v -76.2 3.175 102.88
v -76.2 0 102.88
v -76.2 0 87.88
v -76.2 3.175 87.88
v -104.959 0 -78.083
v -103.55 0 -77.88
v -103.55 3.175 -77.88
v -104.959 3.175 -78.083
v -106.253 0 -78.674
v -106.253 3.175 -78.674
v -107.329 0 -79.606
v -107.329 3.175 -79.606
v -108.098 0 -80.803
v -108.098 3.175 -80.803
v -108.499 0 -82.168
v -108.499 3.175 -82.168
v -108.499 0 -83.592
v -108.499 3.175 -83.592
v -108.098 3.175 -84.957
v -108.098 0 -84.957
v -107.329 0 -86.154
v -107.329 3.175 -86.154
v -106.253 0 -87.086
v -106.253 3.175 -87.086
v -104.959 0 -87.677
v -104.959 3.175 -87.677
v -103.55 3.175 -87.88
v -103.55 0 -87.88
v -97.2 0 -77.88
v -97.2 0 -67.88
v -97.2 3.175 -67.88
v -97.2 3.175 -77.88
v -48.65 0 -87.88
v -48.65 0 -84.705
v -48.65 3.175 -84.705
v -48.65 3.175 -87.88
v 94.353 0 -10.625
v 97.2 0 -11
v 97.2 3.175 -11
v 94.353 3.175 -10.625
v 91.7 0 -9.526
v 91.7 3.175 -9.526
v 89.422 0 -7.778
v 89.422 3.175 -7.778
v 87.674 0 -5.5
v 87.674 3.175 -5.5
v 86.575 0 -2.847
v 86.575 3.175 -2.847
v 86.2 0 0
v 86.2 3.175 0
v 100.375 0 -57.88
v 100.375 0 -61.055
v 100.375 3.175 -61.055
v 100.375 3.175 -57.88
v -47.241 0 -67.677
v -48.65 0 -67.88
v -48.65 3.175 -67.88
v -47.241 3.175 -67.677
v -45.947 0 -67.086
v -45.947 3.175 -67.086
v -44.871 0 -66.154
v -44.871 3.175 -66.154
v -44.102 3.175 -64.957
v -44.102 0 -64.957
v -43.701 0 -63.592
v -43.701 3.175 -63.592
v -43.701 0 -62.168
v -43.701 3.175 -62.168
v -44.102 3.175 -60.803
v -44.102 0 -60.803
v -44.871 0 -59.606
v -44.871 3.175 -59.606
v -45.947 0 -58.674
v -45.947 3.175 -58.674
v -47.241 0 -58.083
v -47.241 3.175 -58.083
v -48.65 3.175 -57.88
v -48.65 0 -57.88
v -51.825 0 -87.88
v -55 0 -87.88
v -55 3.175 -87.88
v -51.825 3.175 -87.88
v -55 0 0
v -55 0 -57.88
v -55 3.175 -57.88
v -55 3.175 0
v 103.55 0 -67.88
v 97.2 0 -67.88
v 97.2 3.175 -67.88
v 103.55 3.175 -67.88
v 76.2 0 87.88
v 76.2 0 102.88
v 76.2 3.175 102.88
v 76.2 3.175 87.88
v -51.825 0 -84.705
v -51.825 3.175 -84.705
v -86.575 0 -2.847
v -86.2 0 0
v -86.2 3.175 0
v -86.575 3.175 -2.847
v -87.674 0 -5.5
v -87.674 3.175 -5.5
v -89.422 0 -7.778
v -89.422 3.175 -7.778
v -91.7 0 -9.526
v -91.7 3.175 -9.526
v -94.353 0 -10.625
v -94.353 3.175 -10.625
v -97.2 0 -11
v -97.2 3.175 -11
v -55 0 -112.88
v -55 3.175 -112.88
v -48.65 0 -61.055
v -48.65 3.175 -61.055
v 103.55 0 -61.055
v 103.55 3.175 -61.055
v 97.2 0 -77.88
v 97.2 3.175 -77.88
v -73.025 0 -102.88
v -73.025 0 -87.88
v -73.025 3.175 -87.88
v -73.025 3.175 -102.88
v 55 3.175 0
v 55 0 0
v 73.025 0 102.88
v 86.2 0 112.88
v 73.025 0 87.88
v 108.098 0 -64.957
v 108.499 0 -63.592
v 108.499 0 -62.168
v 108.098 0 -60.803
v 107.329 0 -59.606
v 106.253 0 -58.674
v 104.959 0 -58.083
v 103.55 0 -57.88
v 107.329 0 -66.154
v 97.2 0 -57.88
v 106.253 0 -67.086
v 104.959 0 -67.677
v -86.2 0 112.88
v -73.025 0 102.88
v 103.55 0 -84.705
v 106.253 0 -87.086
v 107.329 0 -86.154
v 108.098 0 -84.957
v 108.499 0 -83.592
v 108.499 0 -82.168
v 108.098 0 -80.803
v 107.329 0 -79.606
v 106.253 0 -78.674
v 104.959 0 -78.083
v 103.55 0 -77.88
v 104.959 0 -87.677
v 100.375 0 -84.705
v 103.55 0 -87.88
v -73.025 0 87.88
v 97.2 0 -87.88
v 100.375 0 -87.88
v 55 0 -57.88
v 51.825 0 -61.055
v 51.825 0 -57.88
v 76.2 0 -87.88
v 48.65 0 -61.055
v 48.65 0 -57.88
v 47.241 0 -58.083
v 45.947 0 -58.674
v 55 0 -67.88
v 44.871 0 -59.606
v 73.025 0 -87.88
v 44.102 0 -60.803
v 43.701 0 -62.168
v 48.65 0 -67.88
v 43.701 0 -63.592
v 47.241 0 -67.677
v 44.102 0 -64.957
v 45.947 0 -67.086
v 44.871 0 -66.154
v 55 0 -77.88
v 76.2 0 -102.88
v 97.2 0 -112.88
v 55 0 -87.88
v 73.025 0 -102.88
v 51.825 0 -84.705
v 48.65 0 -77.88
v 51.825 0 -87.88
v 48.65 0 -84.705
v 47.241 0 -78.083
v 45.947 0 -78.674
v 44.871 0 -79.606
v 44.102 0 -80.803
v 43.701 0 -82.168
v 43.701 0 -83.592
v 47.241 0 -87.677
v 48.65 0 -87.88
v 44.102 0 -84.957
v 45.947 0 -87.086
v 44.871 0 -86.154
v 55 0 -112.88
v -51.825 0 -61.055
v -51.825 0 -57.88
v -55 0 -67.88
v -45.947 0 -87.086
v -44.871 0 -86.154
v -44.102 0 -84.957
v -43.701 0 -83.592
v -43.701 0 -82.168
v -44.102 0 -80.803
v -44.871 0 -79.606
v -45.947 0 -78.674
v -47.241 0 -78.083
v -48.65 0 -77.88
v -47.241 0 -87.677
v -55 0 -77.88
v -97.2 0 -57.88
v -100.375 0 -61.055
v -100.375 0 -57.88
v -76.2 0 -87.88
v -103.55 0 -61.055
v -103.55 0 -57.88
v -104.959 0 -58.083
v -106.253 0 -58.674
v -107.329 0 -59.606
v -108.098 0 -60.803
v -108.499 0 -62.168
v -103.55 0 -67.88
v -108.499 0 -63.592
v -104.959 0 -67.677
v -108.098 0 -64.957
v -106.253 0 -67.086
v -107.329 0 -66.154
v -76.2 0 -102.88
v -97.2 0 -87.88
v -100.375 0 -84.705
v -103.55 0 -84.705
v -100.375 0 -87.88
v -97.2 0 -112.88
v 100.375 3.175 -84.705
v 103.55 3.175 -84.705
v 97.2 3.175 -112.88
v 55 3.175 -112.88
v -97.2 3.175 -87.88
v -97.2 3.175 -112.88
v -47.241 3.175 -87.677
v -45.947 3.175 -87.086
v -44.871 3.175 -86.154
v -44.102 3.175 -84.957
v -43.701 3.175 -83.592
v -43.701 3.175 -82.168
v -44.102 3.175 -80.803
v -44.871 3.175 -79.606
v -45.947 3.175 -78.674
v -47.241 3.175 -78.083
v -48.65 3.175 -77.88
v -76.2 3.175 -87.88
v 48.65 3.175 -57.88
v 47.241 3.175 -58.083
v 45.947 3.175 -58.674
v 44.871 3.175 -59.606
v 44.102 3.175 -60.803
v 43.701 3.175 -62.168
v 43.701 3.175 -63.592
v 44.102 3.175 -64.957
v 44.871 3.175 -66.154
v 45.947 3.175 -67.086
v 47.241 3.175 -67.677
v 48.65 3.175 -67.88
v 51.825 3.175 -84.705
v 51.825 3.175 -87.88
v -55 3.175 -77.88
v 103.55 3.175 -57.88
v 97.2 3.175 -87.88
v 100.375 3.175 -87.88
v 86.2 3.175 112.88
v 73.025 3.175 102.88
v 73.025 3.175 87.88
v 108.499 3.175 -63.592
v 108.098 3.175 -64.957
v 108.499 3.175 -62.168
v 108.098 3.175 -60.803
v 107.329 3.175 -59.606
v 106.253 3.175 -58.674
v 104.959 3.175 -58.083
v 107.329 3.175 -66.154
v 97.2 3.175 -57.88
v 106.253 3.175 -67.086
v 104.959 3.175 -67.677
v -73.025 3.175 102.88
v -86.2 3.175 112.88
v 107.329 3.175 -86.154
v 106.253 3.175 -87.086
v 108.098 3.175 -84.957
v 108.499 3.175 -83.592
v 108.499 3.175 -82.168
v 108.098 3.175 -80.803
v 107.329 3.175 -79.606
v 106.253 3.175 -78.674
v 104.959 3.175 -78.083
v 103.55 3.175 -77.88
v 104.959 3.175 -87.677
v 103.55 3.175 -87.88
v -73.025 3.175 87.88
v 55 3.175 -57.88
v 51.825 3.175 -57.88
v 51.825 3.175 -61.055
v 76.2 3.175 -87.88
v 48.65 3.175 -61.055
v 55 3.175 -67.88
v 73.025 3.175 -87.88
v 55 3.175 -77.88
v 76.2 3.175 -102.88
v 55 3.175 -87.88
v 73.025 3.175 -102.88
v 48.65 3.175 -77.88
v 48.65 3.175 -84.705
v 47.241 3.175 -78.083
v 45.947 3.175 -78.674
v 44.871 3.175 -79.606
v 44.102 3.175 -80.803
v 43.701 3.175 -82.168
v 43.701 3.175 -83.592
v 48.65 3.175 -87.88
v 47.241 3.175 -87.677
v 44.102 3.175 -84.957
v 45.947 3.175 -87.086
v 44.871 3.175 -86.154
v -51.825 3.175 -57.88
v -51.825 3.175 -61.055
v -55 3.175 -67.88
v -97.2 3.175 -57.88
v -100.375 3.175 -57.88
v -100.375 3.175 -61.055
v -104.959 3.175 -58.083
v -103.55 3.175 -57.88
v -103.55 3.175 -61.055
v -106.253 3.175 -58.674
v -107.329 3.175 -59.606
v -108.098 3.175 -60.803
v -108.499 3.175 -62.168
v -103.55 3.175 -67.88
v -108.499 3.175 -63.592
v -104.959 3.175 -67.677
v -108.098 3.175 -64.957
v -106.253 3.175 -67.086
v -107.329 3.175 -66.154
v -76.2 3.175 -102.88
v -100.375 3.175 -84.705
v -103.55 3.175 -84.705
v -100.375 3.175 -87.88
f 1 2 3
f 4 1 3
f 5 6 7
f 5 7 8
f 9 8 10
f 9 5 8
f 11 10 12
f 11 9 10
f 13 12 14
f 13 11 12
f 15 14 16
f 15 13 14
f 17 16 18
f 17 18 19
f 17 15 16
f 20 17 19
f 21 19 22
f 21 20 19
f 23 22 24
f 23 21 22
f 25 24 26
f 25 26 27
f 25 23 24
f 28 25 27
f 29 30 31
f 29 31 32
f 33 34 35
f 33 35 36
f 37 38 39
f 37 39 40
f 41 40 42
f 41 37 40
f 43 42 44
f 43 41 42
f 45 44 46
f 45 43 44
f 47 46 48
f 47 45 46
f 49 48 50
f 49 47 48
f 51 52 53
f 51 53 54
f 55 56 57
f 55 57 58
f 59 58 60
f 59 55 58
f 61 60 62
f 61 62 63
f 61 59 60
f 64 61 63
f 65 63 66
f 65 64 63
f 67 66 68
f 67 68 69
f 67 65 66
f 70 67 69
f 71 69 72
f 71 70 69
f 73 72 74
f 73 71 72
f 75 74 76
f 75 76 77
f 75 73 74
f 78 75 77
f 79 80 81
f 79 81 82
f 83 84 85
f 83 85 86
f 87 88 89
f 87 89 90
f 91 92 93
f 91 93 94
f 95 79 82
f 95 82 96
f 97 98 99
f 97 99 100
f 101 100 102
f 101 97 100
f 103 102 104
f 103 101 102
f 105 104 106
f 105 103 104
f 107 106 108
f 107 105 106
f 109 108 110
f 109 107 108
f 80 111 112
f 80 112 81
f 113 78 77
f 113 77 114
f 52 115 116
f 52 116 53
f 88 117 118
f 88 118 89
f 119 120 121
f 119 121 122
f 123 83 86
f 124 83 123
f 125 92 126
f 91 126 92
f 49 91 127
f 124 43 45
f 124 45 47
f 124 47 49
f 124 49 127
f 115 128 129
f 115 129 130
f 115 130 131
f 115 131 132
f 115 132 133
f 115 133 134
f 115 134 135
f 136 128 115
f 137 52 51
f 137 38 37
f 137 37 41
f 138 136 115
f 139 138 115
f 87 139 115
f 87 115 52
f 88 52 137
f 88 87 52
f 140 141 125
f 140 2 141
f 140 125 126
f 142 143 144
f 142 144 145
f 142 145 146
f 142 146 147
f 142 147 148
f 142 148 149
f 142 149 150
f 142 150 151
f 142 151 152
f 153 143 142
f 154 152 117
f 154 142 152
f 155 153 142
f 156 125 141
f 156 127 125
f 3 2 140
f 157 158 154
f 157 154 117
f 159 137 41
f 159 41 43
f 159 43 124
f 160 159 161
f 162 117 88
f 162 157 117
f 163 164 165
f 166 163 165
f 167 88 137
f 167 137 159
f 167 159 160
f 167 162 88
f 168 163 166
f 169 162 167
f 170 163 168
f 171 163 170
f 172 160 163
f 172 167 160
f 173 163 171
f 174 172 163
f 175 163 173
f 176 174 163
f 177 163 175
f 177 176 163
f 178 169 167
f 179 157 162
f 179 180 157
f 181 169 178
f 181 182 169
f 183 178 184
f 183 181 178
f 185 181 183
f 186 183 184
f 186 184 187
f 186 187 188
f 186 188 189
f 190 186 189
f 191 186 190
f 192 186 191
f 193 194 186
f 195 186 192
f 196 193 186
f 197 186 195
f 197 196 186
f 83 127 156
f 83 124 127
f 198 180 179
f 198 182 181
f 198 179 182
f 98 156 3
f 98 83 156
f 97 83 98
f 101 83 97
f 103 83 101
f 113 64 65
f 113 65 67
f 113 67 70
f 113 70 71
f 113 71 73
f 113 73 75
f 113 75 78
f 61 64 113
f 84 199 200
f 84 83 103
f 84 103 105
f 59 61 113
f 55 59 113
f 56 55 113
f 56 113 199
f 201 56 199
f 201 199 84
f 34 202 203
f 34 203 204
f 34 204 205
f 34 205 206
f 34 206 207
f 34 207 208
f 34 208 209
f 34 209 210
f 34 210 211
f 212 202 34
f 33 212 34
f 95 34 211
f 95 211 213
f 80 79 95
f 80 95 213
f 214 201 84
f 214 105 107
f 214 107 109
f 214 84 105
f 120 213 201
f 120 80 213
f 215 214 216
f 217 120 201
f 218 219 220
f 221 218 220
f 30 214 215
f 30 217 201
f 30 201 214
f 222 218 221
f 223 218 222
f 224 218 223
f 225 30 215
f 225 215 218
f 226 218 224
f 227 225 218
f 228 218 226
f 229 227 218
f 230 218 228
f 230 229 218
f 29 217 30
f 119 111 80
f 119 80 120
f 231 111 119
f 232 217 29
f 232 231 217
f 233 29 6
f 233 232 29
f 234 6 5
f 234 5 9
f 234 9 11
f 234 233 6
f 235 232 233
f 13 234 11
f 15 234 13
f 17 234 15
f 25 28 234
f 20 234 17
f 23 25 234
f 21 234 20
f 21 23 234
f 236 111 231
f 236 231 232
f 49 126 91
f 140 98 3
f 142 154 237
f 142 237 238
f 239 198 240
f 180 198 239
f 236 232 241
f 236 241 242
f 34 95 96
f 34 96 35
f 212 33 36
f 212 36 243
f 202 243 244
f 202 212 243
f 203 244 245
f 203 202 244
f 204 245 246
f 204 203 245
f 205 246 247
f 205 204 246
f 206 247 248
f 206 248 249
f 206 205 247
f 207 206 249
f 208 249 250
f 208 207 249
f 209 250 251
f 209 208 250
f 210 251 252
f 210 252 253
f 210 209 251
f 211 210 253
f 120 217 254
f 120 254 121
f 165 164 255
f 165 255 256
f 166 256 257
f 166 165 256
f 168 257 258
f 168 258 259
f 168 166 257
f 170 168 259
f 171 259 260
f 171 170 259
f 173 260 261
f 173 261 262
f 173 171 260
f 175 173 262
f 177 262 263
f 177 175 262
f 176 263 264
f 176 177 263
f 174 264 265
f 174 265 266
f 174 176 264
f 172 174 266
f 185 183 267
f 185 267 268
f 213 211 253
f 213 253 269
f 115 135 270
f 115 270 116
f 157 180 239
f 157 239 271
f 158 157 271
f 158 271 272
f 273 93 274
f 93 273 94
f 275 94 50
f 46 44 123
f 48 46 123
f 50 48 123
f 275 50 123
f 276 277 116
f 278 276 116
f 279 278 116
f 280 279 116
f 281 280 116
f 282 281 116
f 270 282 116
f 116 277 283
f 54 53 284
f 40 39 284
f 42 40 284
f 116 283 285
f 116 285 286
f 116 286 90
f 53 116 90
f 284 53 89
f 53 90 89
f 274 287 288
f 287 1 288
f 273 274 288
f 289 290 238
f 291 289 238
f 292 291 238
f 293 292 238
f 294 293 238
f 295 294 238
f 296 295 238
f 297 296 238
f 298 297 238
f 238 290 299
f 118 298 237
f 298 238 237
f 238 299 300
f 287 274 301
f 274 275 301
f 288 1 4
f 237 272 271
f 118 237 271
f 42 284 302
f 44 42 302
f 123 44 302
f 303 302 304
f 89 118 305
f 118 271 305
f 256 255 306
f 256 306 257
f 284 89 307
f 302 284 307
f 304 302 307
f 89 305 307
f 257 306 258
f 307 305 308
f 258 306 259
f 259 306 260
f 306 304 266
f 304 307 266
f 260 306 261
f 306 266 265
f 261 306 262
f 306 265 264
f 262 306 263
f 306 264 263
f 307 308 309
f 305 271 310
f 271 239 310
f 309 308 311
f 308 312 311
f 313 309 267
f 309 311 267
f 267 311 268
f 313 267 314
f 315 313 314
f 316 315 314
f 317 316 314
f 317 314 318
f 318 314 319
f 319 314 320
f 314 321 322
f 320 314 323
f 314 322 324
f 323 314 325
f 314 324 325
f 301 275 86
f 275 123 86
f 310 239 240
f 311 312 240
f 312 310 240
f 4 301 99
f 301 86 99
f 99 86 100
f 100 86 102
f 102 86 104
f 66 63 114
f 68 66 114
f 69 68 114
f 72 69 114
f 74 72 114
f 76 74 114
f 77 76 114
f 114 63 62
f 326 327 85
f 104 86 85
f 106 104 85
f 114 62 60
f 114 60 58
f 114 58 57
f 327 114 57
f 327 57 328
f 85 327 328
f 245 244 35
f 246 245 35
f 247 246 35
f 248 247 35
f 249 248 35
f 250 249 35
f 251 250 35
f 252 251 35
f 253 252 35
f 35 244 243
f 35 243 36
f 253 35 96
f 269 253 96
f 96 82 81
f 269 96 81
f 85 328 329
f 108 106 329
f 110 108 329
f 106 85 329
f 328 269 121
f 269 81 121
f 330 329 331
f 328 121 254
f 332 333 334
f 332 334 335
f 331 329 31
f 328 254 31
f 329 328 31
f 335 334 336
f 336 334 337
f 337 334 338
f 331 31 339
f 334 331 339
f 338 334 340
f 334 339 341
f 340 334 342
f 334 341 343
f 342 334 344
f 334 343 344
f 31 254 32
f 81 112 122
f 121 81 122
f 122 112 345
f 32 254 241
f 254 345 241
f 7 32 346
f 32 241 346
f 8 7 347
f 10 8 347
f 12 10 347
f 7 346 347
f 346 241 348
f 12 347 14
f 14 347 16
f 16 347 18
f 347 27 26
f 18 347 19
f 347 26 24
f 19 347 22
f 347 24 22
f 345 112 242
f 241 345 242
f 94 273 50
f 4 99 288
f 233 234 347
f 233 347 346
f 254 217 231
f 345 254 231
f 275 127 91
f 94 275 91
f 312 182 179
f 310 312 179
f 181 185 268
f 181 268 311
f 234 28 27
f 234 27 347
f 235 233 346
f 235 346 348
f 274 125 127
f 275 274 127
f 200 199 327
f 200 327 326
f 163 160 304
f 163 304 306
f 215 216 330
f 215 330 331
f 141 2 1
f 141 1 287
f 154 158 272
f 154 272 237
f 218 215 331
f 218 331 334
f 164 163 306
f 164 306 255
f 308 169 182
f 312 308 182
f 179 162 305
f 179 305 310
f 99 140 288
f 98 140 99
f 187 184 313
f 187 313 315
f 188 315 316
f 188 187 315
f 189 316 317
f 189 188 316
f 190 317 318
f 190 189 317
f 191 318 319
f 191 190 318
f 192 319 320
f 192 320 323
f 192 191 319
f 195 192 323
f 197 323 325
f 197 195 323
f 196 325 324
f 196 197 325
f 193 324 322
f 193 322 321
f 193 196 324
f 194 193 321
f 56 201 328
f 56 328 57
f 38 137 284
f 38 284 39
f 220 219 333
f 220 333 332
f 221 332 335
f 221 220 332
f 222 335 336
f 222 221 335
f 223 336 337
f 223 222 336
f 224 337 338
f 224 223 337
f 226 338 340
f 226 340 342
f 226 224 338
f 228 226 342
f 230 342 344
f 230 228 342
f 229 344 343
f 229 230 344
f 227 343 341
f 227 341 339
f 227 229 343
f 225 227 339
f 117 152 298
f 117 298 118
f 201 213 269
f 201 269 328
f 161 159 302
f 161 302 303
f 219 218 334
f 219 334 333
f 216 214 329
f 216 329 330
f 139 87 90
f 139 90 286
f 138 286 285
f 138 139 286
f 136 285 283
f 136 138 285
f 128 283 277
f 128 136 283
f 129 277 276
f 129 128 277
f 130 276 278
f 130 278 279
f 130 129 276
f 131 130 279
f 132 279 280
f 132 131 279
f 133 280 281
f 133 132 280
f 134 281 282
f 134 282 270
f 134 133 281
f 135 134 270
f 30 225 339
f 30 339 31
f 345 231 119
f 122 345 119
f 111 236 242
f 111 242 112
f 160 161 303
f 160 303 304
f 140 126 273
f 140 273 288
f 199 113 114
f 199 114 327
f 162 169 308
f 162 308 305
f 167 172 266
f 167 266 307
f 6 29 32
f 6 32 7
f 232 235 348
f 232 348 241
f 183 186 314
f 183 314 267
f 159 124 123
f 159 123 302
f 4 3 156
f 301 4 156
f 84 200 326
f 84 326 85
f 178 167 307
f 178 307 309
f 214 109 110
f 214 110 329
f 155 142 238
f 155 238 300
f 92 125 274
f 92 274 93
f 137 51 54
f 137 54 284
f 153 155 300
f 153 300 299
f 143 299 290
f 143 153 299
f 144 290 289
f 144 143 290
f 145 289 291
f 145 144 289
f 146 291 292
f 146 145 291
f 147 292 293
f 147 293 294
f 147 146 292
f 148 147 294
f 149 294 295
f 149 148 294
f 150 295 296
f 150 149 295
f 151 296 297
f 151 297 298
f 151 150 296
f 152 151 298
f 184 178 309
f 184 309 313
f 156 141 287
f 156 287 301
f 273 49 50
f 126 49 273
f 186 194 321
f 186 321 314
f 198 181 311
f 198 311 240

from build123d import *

# Parameters (mm, degrees)
SKETCH1_W           = 3.175
SKETCH1_H           = 15
BOSS_EXTRUDE1_DEPTH = 3.175


with BuildPart() as part:
    # Sketch1 → Boss-Extrude1 (new body)
    with BuildSketch(Plane(origin=(0, 0, 0), x_dir=(1, 0, 0), z_dir=(0, 1, 0))):
        with BuildLine():
            Line((-55, 0), (55, 0))
            Line((55, 0), (55, 57.88))
            Line((55, 57.88), (51.825, 57.88))
            Line((51.825, 57.88), (51.825, 61.055))
            Line((51.825, 61.055), (48.65, 61.055))
            Line((48.65, 61.055), (48.65, 57.88))
            ThreePointArc((48.65, 57.88), (43.65, 62.88), (48.65, 67.88))
            Line((48.65, 67.88), (55, 67.88))
            Line((55, 67.88), (55, 77.88))
            Line((55, 77.88), (48.65, 77.88))
            ThreePointArc((48.65, 77.88), (43.65, 82.88), (48.65, 87.88))
            Line((48.65, 87.88), (48.65, 84.705))
            Line((48.65, 84.705), (51.825, 84.705))
            Line((51.825, 84.705), (51.825, 87.88))
            Line((51.825, 87.88), (55, 87.88))
            Line((55, 87.88), (55, 112.88))
            Line((55, 112.88), (76.2, 112.88))
            Line((76.2, 112.88), (86.2, 112.88))
            Line((86.2, 112.88), (97.2, 112.88))
            Line((97.2, 112.88), (97.2, 87.88))
            Line((97.2, 87.88), (100.375, 87.88))
            Line((100.375, 87.88), (100.375, 84.705))
            Line((100.375, 84.705), (103.55, 84.705))
            Line((103.55, 84.705), (103.55, 87.88))
            ThreePointArc((103.55, 87.88), (108.55, 82.88), (103.55, 77.88))
            Line((103.55, 77.88), (97.2, 77.88))
            Line((97.2, 77.88), (97.2, 67.88))
            Line((97.2, 67.88), (103.55, 67.88))
            ThreePointArc((103.55, 67.88), (108.55, 62.88), (103.55, 57.88))
            Line((103.55, 57.88), (103.55, 61.055))
            Line((103.55, 61.055), (100.375, 61.055))
            Line((100.375, 61.055), (100.375, 57.88))
            Line((100.375, 57.88), (97.2, 57.88))
            Line((97.2, 57.88), (97.2, 11))
            ThreePointArc((97.2, 11), (89.421825407, 7.778174593), (86.2, 0))
            Line((86.2, 0), (86.2, -102.88))
            Line((86.2, -102.88), (86.2, -112.88))
            Line((86.2, -112.88), (76.2, -112.88))
            Line((76.2, -112.88), (-76.2, -112.88))
            Line((-76.2, -112.88), (-86.2, -112.88))
            Line((-86.2, -112.88), (-86.2, -102.88))
            Line((-86.2, -102.88), (-86.2, 0))
            ThreePointArc((-86.2, 0), (-89.421825407, 7.778174593), (-97.2, 11))
            Line((-97.2, 11), (-97.2, 57.88))
            Line((-97.2, 57.88), (-100.375, 57.88))
            Line((-100.375, 57.88), (-100.375, 61.055))
            Line((-100.375, 61.055), (-103.55, 61.055))
            Line((-103.55, 61.055), (-103.55, 57.88))
            ThreePointArc((-103.55, 57.88), (-108.55, 62.88), (-103.55, 67.88))
            Line((-103.55, 67.88), (-97.2, 67.88))
            Line((-97.2, 67.88), (-97.2, 77.88))
            Line((-97.2, 77.88), (-103.55, 77.88))
            ThreePointArc((-103.55, 77.88), (-108.55, 82.88), (-103.55, 87.88))
            Line((-103.55, 87.88), (-103.55, 84.705))
            Line((-103.55, 84.705), (-100.375, 84.705))
            Line((-100.375, 84.705), (-100.375, 87.88))
            Line((-100.375, 87.88), (-97.2, 87.88))
            Line((-97.2, 87.88), (-97.2, 112.88))
            Line((-97.2, 112.88), (-86.2, 112.88))
            Line((-86.2, 112.88), (-76.2, 112.88))
            Line((-76.2, 112.88), (-55, 112.88))
            Line((-55, 112.88), (-55, 87.88))
            Line((-55, 87.88), (-51.825, 87.88))
            Line((-51.825, 87.88), (-51.825, 84.705))
            Line((-51.825, 84.705), (-48.65, 84.705))
            Line((-48.65, 84.705), (-48.65, 87.88))
            ThreePointArc((-48.65, 87.88), (-43.65, 82.88), (-48.65, 77.88))
            Line((-48.65, 77.88), (-55, 77.88))
            Line((-55, 77.88), (-55, 67.88))
            Line((-55, 67.88), (-48.65, 67.88))
            ThreePointArc((-48.65, 67.88), (-43.65, 62.88), (-48.65, 57.88))
            Line((-48.65, 57.88), (-48.65, 61.055))
            Line((-48.65, 61.055), (-51.825, 61.055))
            Line((-51.825, 61.055), (-51.825, 57.88))
            Line((-51.825, 57.88), (-55, 57.88))
            Line((-55, 57.88), (-55, 0))
        make_face()
        with Locations((74.6125, 95.38)):
            Rectangle(SKETCH1_W, SKETCH1_H, mode=Mode.SUBTRACT)
        with Locations((-74.6125, 95.38)):
            Rectangle(SKETCH1_W, SKETCH1_H, mode=Mode.SUBTRACT)
        with Locations((-74.6125, -95.38)):
            Rectangle(SKETCH1_W, SKETCH1_H, mode=Mode.SUBTRACT)
        with Locations((74.6125, -95.38)):
            Rectangle(SKETCH1_W, SKETCH1_H, mode=Mode.SUBTRACT)
    extrude(amount=BOSS_EXTRUDE1_DEPTH)


solid = part.part
